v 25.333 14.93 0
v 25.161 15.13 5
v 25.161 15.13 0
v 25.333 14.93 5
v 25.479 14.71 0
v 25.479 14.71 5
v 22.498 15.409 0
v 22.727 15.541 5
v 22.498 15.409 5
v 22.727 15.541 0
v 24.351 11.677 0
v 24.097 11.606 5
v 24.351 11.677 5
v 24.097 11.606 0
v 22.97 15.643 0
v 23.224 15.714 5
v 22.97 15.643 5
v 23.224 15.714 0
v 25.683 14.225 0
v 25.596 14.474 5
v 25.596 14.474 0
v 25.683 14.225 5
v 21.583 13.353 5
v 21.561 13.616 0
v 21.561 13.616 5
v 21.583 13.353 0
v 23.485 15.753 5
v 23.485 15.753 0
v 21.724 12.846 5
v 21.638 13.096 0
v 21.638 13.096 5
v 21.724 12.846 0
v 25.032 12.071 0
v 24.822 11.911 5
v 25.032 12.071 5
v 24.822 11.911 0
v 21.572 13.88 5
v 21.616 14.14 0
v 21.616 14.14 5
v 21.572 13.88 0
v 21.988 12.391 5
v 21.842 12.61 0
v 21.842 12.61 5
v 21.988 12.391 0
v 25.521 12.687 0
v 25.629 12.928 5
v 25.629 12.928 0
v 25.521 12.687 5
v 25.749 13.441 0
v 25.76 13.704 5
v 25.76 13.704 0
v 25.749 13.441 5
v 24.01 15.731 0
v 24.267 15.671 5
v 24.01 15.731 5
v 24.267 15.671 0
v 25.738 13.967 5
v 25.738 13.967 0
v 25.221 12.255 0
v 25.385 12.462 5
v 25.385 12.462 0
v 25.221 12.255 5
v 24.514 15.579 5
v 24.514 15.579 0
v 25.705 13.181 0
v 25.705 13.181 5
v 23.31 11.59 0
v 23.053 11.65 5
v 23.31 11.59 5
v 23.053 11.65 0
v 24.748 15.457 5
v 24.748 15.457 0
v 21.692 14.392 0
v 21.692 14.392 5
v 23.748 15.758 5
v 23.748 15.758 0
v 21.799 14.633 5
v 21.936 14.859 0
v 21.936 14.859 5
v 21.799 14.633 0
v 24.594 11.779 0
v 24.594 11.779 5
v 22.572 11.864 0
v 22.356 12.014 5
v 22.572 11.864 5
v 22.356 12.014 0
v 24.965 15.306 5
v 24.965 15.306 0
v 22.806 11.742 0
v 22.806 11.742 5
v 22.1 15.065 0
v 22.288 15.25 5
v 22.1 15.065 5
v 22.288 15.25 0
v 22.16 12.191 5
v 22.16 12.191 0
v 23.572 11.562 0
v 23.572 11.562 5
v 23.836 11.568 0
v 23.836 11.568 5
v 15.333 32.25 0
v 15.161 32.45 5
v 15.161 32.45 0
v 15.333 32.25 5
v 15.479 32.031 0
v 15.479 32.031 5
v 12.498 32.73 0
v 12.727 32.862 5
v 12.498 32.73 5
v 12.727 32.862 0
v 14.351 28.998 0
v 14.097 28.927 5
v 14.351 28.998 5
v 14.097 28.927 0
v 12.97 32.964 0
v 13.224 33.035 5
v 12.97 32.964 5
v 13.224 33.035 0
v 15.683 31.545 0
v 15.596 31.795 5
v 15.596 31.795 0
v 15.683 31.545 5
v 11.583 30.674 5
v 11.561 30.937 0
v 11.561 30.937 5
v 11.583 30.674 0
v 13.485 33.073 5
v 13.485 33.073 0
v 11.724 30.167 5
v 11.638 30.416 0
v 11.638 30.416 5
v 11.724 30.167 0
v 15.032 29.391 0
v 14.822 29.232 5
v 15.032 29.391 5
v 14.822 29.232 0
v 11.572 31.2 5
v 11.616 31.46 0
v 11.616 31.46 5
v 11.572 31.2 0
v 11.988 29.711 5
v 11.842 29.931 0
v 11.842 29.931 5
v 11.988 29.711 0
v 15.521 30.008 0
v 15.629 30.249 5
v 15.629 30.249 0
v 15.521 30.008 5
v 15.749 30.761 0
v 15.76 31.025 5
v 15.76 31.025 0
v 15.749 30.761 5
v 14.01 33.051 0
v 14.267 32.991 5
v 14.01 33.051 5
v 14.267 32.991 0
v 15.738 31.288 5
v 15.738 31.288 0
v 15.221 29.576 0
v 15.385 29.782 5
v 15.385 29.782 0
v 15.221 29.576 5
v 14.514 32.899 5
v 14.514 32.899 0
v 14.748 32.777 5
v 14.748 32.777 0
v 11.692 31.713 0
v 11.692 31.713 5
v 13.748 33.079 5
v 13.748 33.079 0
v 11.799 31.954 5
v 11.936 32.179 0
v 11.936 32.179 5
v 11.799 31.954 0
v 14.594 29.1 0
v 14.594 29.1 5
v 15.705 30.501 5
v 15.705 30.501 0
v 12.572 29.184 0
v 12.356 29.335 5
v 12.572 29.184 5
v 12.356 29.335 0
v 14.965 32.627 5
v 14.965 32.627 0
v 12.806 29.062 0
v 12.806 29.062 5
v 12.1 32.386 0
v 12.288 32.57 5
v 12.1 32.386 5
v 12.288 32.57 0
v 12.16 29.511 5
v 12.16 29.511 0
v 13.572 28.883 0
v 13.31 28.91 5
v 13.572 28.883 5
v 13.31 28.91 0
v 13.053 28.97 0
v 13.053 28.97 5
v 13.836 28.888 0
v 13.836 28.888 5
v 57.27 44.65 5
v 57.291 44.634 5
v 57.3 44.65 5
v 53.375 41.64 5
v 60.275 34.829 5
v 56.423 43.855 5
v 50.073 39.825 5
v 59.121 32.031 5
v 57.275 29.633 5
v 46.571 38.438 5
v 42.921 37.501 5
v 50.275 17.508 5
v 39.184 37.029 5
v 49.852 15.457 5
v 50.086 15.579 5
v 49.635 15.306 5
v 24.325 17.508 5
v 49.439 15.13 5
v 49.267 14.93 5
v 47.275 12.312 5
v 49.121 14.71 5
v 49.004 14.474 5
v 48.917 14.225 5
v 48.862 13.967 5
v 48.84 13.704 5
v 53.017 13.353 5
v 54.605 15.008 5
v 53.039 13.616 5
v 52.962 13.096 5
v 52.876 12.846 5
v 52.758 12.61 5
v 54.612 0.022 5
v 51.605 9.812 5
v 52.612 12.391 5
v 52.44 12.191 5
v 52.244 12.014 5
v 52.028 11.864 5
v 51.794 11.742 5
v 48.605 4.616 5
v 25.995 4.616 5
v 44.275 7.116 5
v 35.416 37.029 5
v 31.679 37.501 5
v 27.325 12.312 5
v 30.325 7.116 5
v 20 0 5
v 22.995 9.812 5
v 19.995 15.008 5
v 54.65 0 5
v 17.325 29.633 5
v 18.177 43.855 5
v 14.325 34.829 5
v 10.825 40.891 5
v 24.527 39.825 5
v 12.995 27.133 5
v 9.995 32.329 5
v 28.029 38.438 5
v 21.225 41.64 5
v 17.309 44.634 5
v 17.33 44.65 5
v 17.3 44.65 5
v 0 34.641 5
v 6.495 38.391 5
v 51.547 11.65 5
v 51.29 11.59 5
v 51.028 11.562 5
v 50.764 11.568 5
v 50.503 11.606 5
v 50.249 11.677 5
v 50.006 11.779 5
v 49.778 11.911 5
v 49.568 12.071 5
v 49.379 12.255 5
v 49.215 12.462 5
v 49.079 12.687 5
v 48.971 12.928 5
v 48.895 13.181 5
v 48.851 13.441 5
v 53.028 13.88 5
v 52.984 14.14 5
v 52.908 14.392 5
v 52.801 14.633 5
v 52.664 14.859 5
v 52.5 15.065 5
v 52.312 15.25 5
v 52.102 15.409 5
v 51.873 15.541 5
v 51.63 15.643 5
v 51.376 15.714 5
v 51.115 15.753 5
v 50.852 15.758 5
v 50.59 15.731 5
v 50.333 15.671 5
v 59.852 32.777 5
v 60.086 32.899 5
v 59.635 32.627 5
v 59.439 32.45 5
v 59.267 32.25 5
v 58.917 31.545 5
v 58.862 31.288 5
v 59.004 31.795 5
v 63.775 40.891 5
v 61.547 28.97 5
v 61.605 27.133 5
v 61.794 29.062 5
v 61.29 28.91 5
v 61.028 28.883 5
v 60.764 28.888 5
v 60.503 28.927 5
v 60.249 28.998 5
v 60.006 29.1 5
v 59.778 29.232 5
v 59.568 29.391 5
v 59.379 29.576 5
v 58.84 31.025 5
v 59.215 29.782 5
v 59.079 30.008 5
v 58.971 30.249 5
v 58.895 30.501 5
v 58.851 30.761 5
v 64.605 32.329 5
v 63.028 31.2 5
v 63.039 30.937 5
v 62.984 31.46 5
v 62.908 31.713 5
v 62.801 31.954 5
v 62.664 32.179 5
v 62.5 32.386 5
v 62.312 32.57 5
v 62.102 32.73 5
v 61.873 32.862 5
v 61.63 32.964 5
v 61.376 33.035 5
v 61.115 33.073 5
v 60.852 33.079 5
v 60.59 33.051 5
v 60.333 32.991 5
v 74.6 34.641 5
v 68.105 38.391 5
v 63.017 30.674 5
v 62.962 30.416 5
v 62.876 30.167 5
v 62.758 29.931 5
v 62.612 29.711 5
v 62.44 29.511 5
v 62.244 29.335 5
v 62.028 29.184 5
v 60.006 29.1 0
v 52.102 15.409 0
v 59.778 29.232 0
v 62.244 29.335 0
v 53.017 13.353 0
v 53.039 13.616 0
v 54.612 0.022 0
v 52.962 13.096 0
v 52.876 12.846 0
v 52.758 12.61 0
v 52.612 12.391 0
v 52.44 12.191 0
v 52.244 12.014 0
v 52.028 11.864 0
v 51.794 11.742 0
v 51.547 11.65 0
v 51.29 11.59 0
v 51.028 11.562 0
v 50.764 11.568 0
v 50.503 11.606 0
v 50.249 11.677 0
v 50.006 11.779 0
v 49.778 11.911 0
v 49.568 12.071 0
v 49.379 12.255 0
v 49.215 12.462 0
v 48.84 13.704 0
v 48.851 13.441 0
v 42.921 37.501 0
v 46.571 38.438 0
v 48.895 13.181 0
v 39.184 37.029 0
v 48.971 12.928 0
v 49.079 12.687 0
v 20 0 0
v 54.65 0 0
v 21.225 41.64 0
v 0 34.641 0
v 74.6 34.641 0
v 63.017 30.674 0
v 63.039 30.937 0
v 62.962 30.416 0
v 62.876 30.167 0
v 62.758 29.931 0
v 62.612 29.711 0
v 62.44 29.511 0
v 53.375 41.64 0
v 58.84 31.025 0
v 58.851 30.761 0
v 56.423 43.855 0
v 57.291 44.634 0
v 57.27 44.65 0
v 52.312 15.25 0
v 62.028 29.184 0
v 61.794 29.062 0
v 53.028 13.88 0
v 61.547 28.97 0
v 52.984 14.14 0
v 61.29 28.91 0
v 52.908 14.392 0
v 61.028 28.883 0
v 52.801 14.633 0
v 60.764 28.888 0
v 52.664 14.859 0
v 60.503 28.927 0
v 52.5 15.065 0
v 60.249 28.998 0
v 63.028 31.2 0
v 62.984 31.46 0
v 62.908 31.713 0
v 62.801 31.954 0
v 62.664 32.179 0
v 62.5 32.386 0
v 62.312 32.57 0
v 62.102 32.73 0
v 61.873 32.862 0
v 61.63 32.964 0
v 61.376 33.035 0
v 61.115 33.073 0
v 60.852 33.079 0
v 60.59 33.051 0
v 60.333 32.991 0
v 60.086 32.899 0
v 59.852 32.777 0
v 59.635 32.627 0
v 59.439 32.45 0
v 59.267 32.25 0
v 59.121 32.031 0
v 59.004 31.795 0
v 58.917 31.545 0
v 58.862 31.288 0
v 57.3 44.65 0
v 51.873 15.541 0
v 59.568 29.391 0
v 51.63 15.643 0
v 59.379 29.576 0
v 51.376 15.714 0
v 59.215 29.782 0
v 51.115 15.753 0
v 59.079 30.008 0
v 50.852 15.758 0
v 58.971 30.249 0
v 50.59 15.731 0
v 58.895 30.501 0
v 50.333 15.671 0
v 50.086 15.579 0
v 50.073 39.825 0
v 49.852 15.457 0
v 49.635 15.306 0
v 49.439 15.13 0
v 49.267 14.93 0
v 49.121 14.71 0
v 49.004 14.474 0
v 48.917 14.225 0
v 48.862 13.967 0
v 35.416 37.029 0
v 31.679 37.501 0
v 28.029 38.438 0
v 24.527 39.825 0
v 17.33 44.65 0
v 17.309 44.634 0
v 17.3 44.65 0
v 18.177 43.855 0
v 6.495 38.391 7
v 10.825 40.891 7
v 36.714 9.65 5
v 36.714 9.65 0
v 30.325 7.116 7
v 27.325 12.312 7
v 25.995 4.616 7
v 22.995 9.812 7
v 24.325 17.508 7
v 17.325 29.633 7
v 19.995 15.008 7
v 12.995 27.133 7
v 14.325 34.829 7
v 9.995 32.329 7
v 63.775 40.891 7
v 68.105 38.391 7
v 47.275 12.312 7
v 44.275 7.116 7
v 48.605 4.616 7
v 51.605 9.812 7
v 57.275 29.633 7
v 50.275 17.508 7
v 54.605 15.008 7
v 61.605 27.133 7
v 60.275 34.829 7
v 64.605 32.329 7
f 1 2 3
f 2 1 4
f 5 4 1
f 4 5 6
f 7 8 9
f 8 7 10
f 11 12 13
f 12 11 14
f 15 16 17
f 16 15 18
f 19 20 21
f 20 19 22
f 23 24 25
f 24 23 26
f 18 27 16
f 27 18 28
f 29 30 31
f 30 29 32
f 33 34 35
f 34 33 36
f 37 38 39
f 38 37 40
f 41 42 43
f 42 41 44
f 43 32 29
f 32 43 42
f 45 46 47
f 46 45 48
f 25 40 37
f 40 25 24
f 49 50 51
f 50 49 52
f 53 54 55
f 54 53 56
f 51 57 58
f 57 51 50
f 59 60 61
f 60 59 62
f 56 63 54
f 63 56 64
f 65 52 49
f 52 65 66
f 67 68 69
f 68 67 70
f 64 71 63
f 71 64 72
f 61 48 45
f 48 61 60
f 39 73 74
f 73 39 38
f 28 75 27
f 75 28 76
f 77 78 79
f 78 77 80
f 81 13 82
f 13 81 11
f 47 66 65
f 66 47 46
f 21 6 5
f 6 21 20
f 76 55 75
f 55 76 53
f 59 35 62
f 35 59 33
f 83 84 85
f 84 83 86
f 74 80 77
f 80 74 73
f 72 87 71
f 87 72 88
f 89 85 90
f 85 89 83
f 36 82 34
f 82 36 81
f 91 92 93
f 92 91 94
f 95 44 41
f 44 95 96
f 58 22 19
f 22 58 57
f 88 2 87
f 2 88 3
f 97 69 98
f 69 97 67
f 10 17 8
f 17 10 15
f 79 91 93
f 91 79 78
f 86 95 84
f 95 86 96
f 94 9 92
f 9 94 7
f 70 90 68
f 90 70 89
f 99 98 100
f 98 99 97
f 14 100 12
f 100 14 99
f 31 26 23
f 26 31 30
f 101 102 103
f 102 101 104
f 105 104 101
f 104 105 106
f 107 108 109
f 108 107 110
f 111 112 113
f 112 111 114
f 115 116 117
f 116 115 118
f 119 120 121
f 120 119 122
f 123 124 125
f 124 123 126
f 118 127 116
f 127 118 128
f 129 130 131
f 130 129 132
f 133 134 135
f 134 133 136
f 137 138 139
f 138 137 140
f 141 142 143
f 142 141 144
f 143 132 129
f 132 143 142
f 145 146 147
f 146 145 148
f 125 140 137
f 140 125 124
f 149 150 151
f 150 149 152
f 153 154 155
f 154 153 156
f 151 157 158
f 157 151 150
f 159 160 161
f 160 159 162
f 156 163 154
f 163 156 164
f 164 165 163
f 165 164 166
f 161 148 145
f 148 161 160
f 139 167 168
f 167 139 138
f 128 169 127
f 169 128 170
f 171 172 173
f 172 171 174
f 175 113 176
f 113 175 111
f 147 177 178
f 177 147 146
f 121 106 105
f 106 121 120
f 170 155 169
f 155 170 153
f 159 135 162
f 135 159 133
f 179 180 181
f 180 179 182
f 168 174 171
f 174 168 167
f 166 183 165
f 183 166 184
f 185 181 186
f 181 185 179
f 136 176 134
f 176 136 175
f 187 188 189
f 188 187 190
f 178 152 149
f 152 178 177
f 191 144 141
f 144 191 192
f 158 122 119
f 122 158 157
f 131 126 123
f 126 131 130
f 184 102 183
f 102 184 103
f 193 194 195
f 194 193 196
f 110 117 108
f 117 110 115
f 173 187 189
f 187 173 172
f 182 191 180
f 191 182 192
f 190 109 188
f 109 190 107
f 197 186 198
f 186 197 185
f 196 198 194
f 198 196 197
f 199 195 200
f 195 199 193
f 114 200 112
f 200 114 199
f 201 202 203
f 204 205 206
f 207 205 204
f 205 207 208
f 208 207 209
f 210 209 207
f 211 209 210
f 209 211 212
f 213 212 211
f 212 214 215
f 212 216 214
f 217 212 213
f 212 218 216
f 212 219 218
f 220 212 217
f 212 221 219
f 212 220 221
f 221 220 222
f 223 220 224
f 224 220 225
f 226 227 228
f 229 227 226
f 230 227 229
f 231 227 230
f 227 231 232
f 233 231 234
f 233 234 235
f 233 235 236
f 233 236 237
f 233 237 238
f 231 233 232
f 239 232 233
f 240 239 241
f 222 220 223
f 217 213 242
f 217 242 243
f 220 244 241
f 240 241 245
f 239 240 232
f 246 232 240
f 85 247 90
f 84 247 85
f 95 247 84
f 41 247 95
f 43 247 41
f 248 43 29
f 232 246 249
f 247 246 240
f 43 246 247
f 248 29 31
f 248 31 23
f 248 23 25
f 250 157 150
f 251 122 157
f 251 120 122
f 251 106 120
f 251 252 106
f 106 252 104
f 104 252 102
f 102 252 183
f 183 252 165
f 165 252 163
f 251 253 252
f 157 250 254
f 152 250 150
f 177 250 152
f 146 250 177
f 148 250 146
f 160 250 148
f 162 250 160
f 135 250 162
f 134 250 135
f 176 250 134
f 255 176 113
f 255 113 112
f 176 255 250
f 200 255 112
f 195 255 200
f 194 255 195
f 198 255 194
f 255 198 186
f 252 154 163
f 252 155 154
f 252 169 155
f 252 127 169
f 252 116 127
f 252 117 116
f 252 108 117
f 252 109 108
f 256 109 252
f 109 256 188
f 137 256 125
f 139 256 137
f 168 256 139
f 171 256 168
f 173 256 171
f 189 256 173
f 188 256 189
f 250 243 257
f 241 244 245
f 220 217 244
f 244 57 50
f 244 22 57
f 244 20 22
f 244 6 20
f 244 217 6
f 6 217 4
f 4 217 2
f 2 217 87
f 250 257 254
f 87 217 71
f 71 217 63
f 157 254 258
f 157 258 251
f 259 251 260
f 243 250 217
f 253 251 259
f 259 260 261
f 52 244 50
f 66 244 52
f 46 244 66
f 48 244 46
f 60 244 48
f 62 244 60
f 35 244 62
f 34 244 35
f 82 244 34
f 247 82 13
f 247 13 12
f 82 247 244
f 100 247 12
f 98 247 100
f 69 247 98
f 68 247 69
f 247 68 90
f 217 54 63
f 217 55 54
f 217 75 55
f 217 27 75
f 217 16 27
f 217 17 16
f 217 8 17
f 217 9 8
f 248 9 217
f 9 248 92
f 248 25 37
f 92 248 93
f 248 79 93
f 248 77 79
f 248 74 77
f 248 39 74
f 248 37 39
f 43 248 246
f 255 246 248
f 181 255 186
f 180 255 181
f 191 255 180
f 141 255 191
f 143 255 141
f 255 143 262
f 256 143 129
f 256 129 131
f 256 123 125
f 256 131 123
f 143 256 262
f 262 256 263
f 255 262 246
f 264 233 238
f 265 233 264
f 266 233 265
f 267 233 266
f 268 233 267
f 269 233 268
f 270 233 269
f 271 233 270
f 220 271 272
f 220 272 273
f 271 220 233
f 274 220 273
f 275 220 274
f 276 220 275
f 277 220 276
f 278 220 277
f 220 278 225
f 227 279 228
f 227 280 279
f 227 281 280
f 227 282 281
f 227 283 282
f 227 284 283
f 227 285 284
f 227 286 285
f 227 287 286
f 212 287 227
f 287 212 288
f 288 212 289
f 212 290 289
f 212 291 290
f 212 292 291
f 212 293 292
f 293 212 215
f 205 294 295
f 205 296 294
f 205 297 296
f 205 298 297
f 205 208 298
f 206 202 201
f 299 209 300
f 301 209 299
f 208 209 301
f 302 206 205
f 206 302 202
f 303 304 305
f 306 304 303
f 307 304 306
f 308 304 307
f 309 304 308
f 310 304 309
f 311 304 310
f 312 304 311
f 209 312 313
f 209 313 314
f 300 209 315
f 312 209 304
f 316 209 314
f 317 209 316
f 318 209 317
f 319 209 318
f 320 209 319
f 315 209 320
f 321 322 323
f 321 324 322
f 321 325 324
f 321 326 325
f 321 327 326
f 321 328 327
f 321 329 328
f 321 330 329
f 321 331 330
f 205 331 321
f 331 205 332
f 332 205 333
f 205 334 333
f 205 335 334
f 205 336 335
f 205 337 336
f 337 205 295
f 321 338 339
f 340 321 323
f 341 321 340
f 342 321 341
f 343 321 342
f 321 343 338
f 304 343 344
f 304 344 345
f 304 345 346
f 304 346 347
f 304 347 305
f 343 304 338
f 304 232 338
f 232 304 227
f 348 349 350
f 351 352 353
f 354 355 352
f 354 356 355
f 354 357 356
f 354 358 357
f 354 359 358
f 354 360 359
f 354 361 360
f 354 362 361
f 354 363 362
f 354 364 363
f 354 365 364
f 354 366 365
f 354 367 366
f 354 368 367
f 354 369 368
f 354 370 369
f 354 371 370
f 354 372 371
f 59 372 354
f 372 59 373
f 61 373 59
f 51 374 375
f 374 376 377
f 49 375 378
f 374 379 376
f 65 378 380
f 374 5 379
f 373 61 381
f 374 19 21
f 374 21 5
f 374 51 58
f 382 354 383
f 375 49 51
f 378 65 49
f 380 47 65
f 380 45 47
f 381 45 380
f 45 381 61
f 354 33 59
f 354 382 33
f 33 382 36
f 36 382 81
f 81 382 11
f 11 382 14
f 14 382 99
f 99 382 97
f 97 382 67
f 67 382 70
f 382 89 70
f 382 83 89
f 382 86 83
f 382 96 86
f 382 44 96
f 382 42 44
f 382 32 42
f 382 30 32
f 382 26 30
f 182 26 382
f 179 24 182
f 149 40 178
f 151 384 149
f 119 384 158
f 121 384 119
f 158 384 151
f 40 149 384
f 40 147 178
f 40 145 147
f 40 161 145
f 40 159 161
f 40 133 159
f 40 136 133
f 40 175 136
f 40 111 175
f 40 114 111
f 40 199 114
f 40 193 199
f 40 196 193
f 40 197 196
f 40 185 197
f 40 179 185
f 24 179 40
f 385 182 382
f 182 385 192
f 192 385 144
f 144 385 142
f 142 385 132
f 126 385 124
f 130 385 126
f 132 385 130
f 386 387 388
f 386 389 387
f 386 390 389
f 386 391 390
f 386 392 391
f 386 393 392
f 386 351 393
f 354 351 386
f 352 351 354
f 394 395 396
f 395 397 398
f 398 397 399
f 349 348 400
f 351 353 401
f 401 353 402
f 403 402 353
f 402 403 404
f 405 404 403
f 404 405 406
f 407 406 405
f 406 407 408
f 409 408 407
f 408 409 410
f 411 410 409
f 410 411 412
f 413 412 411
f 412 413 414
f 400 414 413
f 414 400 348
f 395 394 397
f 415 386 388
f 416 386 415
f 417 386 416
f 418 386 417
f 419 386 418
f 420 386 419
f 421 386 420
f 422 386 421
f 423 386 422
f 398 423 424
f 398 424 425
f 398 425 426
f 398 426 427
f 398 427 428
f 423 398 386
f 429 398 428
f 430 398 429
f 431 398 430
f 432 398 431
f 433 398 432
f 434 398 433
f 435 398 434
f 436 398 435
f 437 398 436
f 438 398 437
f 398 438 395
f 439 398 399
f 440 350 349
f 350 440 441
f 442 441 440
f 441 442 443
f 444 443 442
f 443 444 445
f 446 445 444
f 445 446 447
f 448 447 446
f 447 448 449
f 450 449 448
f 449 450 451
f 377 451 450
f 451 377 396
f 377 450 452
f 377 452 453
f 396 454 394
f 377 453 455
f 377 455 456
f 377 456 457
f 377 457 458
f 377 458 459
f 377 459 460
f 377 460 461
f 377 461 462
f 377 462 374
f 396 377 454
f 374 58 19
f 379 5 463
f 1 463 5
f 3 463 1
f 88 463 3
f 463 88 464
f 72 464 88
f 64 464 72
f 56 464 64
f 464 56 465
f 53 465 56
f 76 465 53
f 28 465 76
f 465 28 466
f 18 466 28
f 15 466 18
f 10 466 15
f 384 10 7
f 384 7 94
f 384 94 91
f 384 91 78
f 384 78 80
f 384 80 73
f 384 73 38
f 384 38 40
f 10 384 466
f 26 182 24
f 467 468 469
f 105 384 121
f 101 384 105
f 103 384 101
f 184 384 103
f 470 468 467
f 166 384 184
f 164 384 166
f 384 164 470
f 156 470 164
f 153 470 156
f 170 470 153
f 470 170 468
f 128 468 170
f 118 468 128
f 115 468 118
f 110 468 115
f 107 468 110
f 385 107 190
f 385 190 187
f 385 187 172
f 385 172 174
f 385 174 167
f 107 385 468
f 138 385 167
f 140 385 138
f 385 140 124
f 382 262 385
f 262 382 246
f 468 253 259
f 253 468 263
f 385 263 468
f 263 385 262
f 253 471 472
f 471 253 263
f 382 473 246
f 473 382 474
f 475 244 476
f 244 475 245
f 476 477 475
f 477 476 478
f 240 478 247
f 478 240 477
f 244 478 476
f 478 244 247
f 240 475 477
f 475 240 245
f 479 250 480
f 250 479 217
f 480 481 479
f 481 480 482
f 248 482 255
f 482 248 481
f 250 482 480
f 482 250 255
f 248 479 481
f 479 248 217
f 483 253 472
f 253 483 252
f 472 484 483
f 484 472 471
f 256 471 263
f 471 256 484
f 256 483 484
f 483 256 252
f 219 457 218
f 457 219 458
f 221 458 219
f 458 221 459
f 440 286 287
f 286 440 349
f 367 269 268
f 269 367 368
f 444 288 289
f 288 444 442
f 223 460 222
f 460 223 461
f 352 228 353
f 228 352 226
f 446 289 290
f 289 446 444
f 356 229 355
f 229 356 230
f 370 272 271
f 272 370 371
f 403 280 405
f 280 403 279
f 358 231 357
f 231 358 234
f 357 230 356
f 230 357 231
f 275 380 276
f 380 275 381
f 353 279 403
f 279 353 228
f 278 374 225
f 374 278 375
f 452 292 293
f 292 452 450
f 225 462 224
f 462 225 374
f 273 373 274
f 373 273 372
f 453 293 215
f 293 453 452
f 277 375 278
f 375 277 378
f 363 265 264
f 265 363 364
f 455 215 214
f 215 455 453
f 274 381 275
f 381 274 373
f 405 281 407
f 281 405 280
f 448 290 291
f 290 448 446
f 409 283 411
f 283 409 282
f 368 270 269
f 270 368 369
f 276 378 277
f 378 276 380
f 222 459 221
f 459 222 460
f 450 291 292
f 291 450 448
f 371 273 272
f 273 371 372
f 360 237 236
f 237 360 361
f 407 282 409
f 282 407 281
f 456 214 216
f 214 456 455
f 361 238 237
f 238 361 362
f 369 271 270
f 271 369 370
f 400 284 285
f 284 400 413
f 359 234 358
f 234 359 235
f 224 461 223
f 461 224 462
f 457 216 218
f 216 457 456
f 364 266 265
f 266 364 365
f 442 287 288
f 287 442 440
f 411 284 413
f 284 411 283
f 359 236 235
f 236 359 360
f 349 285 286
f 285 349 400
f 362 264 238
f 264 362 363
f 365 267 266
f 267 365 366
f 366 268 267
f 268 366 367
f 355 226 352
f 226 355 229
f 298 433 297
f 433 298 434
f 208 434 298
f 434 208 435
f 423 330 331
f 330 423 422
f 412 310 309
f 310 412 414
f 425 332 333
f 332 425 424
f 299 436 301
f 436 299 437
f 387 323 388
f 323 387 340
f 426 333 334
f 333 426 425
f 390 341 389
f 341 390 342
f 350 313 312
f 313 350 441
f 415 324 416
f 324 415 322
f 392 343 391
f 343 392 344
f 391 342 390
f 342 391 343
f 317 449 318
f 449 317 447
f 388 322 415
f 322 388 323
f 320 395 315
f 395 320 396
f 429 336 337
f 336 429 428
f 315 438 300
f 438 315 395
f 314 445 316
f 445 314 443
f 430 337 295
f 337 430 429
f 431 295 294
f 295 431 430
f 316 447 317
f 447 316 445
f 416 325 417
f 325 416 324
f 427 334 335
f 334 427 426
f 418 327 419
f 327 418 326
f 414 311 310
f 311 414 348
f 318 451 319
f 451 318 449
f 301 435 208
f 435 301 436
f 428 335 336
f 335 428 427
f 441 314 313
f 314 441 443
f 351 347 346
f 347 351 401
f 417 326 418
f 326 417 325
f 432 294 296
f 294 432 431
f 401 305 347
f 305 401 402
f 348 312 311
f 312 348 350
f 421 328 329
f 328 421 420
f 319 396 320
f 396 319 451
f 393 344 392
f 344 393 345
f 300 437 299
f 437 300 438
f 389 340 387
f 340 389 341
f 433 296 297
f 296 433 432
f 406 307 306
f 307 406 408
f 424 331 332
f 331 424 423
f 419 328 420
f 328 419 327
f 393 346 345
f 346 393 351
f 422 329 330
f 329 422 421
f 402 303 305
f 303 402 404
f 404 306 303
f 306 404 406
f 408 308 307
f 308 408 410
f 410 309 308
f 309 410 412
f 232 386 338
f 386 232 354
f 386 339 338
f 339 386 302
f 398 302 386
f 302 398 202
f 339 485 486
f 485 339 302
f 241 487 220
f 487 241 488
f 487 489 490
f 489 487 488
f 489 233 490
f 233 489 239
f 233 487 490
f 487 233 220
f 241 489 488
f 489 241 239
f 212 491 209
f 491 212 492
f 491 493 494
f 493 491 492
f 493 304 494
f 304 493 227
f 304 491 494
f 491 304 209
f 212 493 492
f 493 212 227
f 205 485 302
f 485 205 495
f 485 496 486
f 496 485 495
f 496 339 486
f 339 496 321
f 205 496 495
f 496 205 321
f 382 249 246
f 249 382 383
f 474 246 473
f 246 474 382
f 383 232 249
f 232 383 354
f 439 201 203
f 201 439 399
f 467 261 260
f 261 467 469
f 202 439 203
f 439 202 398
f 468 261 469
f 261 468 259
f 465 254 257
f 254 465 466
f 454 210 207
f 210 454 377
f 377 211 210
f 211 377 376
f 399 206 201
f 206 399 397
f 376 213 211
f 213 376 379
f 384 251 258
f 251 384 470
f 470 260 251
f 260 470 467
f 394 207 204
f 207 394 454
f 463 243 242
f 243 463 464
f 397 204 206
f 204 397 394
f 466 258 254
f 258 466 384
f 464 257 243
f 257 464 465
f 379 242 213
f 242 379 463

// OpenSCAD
// file: functions.scad
// PRUSA Mendel  
// Functions used in many files
// GNU GPL v2
// Josef Průša
// josefprusa@me.com
// prusadjs.cz
// http://www.reprap.org/wiki/Prusa_Mendel
// http://github.com/prusajr/PrusaMendel

module nut(d,h,horizontal=true){
cornerdiameter =  (d / 2) / cos (180 / 6);
cylinder(h = h, r = cornerdiameter, $fn = 6);
if(horizontal){
for(i = [1:6]){
	rotate([0,0,60*i]) translate([-cornerdiameter-0.2,0,0]) rotate([0,0,-45]) cube(size = [2,2,h]);
}}
}

// By nophead
module polyhole(d,h) {
    n = max(round(2 * d),3);
    rotate([0,0,180])
        cylinder(h = h, r = (d / 2) / cos (180 / n), $fn = n);
}

module roundcorner(diameter){
	difference(){
		cube(size = [diameter,diameter,99], center = false);
		translate(v = [diameter, diameter, 0]) cylinder(h = 100, r=diameter, center=true);
	}
}
// file: metric.scad
// PRUSA Mendel  
// Default metric sizes
// GNU GPL v2
// Josef Průša
// josefprusa@me.com
// prusadjs.cz
// http://www.reprap.org/wiki/Prusa_Mendel
// http://github.com/prusajr/PrusaMendel

// DONT CHANGE THIS FILE! ALTER VALUES IN CONFIGURATION.SCAD INSTEAD

// RODS

threaded_rod_diameter = 8;
threaded_rod_diameter_horizontal = 8;
smooth_bar_diameter = 8;
smooth_bar_diameter_horizontal = 8;

// Nuts and bolts

m8_diameter = 8;
m8_nut_diameter = 14.5;

m4_diameter = 4;
m4_nut_diameter = 7.5;

m3_diameter = 3;
m3_nut_diameter = 5;

// Bushing holder

bushing_core_diameter = smooth_bar_diameter;
bushing_material_thickness = 1;

// Motors

motor_shaft = 5.1;
// file: configuration.scad
// PRUSA Mendel  
// Configuration file
// GNU GPL v2
// Josef Průša
// josefprusa@me.com
// prusadjs.cz
// http://www.reprap.org/wiki/Prusa_Mendel
// http://github.com/prusajr/PrusaMendel

// PLEASE SELECT ONE OF THE CONFIGURATIONS BELOW
// BY UN-COMMENTING IT

// Uncomment for metric settings
// METRIC METRIC METRIC METRIC METRIC METRIC METRIC METRIC 

include <metric.scad>;

// Uncomment for imperial settings
// IMPERIAL IMPERIAL IMPERIAL IMPERIAL IMPERIAL IMPERIAL IMPERIAL 

//include <sae.scad>;

//thin_wall = 3;
// LM8UU
//linear = false;

// override settings by customizing below
// CUSTOM CUSTOM CUSTOM CUSTOM CUSTOM CUSTOM CUSTOM CUSTOM CUSTOM

threaded_rod_diameter = 8.2;
threaded_rod_diameter_horizontal = 8.2;
smooth_bar_diameter = 8.3;
smooth_bar_diameter_horizontal = 8.3;

// Nuts and bolts

m8_diameter = 8.3;
m8_nut_diameter = 15;

m4_diameter = 4.2;
m4_nut_diameter = 9;

m3_diameter = 3.3;
m3_nut_diameter = 5.8;

///counted stuff
m3_nut_diameter_bigger = ((m3_nut_diameter  / 2) / cos (180 / 6))*2;

// functions 
include <functions.scad>
// main file
// C. Strang
// F. Beachler, Longevity Software LLC. d.b.a. Terawatt Industries

include <configuration.scad>;


$fn=50;

a = 30;								// parts angle
partthickness = 5;			// part thickness
screwdia = m4_diameter;		// hole diameter (i.e m3, m4, m5=5.1)
slottabs = 2;					// slot tab depth (2 normal, -1 remove)
o = 0.01;							// overlay for error free STLs

prism60end(slottabs,screwdia,partthickness);

module prism60end(sl,sc,pa, o)
{
	translate([20,0,0]) rotate([0,0,a]) rail(sl,sc,pa);
	translate([54.60,0,0]) rotate([0,0,-a]) mirror([1,0,0]) rail(sl,sc,pa);
	translate([20,0,0]) rotate([0,0,0]) base1(pa);
	translate([57.3,44.65,0]) rotate([0,0,180]) base2(pa);
}

module base1(th)
{
	difference()
	{
		cube([34.65,13,th]);
		translate([0,0,-o]) rotate([0,0,a]) cube([34.65,13,th+(2*o)]);
		translate([34.65,0,-o]) rotate([0,0,(90-a)]) cube([13,34.65,th+2*o]);
	}
}

module base2(th)
{
	difference()
	{
		cube([40.0,35,th]);
		translate([0,0,-o]) rotate([0,0,61]) cube([40,23,th+2*o]);
		translate([40.0,0,-o]) rotate([0,0,29]) cube([23,40,th+2*o]);
		translate([20.0,-22.32,-o]) rotate([0,0,0]) cylinder(r=30,h=th+2*o,$fn=50);
	}
}


module rail(st,sd,th)
{
	difference()
	{
		cube([20,40,th]);
		screw_holes(st,sd,th);
	}
	translate([7.5,1,th-o]) cube([5,6.0,st+o]);
	translate([7.5,13,th-o]) cube([5,14,st+o]);
	translate([7.5,33,th-o]) cube([5,7,st+o]);
}

module screw_holes(st,sd,th) {
	translate([10,10,-o]) cylinder(r=sd/2,h=2*o+th);
	translate([10,30,-o]) cylinder(r=sd/2,h=2*o+th);
}
